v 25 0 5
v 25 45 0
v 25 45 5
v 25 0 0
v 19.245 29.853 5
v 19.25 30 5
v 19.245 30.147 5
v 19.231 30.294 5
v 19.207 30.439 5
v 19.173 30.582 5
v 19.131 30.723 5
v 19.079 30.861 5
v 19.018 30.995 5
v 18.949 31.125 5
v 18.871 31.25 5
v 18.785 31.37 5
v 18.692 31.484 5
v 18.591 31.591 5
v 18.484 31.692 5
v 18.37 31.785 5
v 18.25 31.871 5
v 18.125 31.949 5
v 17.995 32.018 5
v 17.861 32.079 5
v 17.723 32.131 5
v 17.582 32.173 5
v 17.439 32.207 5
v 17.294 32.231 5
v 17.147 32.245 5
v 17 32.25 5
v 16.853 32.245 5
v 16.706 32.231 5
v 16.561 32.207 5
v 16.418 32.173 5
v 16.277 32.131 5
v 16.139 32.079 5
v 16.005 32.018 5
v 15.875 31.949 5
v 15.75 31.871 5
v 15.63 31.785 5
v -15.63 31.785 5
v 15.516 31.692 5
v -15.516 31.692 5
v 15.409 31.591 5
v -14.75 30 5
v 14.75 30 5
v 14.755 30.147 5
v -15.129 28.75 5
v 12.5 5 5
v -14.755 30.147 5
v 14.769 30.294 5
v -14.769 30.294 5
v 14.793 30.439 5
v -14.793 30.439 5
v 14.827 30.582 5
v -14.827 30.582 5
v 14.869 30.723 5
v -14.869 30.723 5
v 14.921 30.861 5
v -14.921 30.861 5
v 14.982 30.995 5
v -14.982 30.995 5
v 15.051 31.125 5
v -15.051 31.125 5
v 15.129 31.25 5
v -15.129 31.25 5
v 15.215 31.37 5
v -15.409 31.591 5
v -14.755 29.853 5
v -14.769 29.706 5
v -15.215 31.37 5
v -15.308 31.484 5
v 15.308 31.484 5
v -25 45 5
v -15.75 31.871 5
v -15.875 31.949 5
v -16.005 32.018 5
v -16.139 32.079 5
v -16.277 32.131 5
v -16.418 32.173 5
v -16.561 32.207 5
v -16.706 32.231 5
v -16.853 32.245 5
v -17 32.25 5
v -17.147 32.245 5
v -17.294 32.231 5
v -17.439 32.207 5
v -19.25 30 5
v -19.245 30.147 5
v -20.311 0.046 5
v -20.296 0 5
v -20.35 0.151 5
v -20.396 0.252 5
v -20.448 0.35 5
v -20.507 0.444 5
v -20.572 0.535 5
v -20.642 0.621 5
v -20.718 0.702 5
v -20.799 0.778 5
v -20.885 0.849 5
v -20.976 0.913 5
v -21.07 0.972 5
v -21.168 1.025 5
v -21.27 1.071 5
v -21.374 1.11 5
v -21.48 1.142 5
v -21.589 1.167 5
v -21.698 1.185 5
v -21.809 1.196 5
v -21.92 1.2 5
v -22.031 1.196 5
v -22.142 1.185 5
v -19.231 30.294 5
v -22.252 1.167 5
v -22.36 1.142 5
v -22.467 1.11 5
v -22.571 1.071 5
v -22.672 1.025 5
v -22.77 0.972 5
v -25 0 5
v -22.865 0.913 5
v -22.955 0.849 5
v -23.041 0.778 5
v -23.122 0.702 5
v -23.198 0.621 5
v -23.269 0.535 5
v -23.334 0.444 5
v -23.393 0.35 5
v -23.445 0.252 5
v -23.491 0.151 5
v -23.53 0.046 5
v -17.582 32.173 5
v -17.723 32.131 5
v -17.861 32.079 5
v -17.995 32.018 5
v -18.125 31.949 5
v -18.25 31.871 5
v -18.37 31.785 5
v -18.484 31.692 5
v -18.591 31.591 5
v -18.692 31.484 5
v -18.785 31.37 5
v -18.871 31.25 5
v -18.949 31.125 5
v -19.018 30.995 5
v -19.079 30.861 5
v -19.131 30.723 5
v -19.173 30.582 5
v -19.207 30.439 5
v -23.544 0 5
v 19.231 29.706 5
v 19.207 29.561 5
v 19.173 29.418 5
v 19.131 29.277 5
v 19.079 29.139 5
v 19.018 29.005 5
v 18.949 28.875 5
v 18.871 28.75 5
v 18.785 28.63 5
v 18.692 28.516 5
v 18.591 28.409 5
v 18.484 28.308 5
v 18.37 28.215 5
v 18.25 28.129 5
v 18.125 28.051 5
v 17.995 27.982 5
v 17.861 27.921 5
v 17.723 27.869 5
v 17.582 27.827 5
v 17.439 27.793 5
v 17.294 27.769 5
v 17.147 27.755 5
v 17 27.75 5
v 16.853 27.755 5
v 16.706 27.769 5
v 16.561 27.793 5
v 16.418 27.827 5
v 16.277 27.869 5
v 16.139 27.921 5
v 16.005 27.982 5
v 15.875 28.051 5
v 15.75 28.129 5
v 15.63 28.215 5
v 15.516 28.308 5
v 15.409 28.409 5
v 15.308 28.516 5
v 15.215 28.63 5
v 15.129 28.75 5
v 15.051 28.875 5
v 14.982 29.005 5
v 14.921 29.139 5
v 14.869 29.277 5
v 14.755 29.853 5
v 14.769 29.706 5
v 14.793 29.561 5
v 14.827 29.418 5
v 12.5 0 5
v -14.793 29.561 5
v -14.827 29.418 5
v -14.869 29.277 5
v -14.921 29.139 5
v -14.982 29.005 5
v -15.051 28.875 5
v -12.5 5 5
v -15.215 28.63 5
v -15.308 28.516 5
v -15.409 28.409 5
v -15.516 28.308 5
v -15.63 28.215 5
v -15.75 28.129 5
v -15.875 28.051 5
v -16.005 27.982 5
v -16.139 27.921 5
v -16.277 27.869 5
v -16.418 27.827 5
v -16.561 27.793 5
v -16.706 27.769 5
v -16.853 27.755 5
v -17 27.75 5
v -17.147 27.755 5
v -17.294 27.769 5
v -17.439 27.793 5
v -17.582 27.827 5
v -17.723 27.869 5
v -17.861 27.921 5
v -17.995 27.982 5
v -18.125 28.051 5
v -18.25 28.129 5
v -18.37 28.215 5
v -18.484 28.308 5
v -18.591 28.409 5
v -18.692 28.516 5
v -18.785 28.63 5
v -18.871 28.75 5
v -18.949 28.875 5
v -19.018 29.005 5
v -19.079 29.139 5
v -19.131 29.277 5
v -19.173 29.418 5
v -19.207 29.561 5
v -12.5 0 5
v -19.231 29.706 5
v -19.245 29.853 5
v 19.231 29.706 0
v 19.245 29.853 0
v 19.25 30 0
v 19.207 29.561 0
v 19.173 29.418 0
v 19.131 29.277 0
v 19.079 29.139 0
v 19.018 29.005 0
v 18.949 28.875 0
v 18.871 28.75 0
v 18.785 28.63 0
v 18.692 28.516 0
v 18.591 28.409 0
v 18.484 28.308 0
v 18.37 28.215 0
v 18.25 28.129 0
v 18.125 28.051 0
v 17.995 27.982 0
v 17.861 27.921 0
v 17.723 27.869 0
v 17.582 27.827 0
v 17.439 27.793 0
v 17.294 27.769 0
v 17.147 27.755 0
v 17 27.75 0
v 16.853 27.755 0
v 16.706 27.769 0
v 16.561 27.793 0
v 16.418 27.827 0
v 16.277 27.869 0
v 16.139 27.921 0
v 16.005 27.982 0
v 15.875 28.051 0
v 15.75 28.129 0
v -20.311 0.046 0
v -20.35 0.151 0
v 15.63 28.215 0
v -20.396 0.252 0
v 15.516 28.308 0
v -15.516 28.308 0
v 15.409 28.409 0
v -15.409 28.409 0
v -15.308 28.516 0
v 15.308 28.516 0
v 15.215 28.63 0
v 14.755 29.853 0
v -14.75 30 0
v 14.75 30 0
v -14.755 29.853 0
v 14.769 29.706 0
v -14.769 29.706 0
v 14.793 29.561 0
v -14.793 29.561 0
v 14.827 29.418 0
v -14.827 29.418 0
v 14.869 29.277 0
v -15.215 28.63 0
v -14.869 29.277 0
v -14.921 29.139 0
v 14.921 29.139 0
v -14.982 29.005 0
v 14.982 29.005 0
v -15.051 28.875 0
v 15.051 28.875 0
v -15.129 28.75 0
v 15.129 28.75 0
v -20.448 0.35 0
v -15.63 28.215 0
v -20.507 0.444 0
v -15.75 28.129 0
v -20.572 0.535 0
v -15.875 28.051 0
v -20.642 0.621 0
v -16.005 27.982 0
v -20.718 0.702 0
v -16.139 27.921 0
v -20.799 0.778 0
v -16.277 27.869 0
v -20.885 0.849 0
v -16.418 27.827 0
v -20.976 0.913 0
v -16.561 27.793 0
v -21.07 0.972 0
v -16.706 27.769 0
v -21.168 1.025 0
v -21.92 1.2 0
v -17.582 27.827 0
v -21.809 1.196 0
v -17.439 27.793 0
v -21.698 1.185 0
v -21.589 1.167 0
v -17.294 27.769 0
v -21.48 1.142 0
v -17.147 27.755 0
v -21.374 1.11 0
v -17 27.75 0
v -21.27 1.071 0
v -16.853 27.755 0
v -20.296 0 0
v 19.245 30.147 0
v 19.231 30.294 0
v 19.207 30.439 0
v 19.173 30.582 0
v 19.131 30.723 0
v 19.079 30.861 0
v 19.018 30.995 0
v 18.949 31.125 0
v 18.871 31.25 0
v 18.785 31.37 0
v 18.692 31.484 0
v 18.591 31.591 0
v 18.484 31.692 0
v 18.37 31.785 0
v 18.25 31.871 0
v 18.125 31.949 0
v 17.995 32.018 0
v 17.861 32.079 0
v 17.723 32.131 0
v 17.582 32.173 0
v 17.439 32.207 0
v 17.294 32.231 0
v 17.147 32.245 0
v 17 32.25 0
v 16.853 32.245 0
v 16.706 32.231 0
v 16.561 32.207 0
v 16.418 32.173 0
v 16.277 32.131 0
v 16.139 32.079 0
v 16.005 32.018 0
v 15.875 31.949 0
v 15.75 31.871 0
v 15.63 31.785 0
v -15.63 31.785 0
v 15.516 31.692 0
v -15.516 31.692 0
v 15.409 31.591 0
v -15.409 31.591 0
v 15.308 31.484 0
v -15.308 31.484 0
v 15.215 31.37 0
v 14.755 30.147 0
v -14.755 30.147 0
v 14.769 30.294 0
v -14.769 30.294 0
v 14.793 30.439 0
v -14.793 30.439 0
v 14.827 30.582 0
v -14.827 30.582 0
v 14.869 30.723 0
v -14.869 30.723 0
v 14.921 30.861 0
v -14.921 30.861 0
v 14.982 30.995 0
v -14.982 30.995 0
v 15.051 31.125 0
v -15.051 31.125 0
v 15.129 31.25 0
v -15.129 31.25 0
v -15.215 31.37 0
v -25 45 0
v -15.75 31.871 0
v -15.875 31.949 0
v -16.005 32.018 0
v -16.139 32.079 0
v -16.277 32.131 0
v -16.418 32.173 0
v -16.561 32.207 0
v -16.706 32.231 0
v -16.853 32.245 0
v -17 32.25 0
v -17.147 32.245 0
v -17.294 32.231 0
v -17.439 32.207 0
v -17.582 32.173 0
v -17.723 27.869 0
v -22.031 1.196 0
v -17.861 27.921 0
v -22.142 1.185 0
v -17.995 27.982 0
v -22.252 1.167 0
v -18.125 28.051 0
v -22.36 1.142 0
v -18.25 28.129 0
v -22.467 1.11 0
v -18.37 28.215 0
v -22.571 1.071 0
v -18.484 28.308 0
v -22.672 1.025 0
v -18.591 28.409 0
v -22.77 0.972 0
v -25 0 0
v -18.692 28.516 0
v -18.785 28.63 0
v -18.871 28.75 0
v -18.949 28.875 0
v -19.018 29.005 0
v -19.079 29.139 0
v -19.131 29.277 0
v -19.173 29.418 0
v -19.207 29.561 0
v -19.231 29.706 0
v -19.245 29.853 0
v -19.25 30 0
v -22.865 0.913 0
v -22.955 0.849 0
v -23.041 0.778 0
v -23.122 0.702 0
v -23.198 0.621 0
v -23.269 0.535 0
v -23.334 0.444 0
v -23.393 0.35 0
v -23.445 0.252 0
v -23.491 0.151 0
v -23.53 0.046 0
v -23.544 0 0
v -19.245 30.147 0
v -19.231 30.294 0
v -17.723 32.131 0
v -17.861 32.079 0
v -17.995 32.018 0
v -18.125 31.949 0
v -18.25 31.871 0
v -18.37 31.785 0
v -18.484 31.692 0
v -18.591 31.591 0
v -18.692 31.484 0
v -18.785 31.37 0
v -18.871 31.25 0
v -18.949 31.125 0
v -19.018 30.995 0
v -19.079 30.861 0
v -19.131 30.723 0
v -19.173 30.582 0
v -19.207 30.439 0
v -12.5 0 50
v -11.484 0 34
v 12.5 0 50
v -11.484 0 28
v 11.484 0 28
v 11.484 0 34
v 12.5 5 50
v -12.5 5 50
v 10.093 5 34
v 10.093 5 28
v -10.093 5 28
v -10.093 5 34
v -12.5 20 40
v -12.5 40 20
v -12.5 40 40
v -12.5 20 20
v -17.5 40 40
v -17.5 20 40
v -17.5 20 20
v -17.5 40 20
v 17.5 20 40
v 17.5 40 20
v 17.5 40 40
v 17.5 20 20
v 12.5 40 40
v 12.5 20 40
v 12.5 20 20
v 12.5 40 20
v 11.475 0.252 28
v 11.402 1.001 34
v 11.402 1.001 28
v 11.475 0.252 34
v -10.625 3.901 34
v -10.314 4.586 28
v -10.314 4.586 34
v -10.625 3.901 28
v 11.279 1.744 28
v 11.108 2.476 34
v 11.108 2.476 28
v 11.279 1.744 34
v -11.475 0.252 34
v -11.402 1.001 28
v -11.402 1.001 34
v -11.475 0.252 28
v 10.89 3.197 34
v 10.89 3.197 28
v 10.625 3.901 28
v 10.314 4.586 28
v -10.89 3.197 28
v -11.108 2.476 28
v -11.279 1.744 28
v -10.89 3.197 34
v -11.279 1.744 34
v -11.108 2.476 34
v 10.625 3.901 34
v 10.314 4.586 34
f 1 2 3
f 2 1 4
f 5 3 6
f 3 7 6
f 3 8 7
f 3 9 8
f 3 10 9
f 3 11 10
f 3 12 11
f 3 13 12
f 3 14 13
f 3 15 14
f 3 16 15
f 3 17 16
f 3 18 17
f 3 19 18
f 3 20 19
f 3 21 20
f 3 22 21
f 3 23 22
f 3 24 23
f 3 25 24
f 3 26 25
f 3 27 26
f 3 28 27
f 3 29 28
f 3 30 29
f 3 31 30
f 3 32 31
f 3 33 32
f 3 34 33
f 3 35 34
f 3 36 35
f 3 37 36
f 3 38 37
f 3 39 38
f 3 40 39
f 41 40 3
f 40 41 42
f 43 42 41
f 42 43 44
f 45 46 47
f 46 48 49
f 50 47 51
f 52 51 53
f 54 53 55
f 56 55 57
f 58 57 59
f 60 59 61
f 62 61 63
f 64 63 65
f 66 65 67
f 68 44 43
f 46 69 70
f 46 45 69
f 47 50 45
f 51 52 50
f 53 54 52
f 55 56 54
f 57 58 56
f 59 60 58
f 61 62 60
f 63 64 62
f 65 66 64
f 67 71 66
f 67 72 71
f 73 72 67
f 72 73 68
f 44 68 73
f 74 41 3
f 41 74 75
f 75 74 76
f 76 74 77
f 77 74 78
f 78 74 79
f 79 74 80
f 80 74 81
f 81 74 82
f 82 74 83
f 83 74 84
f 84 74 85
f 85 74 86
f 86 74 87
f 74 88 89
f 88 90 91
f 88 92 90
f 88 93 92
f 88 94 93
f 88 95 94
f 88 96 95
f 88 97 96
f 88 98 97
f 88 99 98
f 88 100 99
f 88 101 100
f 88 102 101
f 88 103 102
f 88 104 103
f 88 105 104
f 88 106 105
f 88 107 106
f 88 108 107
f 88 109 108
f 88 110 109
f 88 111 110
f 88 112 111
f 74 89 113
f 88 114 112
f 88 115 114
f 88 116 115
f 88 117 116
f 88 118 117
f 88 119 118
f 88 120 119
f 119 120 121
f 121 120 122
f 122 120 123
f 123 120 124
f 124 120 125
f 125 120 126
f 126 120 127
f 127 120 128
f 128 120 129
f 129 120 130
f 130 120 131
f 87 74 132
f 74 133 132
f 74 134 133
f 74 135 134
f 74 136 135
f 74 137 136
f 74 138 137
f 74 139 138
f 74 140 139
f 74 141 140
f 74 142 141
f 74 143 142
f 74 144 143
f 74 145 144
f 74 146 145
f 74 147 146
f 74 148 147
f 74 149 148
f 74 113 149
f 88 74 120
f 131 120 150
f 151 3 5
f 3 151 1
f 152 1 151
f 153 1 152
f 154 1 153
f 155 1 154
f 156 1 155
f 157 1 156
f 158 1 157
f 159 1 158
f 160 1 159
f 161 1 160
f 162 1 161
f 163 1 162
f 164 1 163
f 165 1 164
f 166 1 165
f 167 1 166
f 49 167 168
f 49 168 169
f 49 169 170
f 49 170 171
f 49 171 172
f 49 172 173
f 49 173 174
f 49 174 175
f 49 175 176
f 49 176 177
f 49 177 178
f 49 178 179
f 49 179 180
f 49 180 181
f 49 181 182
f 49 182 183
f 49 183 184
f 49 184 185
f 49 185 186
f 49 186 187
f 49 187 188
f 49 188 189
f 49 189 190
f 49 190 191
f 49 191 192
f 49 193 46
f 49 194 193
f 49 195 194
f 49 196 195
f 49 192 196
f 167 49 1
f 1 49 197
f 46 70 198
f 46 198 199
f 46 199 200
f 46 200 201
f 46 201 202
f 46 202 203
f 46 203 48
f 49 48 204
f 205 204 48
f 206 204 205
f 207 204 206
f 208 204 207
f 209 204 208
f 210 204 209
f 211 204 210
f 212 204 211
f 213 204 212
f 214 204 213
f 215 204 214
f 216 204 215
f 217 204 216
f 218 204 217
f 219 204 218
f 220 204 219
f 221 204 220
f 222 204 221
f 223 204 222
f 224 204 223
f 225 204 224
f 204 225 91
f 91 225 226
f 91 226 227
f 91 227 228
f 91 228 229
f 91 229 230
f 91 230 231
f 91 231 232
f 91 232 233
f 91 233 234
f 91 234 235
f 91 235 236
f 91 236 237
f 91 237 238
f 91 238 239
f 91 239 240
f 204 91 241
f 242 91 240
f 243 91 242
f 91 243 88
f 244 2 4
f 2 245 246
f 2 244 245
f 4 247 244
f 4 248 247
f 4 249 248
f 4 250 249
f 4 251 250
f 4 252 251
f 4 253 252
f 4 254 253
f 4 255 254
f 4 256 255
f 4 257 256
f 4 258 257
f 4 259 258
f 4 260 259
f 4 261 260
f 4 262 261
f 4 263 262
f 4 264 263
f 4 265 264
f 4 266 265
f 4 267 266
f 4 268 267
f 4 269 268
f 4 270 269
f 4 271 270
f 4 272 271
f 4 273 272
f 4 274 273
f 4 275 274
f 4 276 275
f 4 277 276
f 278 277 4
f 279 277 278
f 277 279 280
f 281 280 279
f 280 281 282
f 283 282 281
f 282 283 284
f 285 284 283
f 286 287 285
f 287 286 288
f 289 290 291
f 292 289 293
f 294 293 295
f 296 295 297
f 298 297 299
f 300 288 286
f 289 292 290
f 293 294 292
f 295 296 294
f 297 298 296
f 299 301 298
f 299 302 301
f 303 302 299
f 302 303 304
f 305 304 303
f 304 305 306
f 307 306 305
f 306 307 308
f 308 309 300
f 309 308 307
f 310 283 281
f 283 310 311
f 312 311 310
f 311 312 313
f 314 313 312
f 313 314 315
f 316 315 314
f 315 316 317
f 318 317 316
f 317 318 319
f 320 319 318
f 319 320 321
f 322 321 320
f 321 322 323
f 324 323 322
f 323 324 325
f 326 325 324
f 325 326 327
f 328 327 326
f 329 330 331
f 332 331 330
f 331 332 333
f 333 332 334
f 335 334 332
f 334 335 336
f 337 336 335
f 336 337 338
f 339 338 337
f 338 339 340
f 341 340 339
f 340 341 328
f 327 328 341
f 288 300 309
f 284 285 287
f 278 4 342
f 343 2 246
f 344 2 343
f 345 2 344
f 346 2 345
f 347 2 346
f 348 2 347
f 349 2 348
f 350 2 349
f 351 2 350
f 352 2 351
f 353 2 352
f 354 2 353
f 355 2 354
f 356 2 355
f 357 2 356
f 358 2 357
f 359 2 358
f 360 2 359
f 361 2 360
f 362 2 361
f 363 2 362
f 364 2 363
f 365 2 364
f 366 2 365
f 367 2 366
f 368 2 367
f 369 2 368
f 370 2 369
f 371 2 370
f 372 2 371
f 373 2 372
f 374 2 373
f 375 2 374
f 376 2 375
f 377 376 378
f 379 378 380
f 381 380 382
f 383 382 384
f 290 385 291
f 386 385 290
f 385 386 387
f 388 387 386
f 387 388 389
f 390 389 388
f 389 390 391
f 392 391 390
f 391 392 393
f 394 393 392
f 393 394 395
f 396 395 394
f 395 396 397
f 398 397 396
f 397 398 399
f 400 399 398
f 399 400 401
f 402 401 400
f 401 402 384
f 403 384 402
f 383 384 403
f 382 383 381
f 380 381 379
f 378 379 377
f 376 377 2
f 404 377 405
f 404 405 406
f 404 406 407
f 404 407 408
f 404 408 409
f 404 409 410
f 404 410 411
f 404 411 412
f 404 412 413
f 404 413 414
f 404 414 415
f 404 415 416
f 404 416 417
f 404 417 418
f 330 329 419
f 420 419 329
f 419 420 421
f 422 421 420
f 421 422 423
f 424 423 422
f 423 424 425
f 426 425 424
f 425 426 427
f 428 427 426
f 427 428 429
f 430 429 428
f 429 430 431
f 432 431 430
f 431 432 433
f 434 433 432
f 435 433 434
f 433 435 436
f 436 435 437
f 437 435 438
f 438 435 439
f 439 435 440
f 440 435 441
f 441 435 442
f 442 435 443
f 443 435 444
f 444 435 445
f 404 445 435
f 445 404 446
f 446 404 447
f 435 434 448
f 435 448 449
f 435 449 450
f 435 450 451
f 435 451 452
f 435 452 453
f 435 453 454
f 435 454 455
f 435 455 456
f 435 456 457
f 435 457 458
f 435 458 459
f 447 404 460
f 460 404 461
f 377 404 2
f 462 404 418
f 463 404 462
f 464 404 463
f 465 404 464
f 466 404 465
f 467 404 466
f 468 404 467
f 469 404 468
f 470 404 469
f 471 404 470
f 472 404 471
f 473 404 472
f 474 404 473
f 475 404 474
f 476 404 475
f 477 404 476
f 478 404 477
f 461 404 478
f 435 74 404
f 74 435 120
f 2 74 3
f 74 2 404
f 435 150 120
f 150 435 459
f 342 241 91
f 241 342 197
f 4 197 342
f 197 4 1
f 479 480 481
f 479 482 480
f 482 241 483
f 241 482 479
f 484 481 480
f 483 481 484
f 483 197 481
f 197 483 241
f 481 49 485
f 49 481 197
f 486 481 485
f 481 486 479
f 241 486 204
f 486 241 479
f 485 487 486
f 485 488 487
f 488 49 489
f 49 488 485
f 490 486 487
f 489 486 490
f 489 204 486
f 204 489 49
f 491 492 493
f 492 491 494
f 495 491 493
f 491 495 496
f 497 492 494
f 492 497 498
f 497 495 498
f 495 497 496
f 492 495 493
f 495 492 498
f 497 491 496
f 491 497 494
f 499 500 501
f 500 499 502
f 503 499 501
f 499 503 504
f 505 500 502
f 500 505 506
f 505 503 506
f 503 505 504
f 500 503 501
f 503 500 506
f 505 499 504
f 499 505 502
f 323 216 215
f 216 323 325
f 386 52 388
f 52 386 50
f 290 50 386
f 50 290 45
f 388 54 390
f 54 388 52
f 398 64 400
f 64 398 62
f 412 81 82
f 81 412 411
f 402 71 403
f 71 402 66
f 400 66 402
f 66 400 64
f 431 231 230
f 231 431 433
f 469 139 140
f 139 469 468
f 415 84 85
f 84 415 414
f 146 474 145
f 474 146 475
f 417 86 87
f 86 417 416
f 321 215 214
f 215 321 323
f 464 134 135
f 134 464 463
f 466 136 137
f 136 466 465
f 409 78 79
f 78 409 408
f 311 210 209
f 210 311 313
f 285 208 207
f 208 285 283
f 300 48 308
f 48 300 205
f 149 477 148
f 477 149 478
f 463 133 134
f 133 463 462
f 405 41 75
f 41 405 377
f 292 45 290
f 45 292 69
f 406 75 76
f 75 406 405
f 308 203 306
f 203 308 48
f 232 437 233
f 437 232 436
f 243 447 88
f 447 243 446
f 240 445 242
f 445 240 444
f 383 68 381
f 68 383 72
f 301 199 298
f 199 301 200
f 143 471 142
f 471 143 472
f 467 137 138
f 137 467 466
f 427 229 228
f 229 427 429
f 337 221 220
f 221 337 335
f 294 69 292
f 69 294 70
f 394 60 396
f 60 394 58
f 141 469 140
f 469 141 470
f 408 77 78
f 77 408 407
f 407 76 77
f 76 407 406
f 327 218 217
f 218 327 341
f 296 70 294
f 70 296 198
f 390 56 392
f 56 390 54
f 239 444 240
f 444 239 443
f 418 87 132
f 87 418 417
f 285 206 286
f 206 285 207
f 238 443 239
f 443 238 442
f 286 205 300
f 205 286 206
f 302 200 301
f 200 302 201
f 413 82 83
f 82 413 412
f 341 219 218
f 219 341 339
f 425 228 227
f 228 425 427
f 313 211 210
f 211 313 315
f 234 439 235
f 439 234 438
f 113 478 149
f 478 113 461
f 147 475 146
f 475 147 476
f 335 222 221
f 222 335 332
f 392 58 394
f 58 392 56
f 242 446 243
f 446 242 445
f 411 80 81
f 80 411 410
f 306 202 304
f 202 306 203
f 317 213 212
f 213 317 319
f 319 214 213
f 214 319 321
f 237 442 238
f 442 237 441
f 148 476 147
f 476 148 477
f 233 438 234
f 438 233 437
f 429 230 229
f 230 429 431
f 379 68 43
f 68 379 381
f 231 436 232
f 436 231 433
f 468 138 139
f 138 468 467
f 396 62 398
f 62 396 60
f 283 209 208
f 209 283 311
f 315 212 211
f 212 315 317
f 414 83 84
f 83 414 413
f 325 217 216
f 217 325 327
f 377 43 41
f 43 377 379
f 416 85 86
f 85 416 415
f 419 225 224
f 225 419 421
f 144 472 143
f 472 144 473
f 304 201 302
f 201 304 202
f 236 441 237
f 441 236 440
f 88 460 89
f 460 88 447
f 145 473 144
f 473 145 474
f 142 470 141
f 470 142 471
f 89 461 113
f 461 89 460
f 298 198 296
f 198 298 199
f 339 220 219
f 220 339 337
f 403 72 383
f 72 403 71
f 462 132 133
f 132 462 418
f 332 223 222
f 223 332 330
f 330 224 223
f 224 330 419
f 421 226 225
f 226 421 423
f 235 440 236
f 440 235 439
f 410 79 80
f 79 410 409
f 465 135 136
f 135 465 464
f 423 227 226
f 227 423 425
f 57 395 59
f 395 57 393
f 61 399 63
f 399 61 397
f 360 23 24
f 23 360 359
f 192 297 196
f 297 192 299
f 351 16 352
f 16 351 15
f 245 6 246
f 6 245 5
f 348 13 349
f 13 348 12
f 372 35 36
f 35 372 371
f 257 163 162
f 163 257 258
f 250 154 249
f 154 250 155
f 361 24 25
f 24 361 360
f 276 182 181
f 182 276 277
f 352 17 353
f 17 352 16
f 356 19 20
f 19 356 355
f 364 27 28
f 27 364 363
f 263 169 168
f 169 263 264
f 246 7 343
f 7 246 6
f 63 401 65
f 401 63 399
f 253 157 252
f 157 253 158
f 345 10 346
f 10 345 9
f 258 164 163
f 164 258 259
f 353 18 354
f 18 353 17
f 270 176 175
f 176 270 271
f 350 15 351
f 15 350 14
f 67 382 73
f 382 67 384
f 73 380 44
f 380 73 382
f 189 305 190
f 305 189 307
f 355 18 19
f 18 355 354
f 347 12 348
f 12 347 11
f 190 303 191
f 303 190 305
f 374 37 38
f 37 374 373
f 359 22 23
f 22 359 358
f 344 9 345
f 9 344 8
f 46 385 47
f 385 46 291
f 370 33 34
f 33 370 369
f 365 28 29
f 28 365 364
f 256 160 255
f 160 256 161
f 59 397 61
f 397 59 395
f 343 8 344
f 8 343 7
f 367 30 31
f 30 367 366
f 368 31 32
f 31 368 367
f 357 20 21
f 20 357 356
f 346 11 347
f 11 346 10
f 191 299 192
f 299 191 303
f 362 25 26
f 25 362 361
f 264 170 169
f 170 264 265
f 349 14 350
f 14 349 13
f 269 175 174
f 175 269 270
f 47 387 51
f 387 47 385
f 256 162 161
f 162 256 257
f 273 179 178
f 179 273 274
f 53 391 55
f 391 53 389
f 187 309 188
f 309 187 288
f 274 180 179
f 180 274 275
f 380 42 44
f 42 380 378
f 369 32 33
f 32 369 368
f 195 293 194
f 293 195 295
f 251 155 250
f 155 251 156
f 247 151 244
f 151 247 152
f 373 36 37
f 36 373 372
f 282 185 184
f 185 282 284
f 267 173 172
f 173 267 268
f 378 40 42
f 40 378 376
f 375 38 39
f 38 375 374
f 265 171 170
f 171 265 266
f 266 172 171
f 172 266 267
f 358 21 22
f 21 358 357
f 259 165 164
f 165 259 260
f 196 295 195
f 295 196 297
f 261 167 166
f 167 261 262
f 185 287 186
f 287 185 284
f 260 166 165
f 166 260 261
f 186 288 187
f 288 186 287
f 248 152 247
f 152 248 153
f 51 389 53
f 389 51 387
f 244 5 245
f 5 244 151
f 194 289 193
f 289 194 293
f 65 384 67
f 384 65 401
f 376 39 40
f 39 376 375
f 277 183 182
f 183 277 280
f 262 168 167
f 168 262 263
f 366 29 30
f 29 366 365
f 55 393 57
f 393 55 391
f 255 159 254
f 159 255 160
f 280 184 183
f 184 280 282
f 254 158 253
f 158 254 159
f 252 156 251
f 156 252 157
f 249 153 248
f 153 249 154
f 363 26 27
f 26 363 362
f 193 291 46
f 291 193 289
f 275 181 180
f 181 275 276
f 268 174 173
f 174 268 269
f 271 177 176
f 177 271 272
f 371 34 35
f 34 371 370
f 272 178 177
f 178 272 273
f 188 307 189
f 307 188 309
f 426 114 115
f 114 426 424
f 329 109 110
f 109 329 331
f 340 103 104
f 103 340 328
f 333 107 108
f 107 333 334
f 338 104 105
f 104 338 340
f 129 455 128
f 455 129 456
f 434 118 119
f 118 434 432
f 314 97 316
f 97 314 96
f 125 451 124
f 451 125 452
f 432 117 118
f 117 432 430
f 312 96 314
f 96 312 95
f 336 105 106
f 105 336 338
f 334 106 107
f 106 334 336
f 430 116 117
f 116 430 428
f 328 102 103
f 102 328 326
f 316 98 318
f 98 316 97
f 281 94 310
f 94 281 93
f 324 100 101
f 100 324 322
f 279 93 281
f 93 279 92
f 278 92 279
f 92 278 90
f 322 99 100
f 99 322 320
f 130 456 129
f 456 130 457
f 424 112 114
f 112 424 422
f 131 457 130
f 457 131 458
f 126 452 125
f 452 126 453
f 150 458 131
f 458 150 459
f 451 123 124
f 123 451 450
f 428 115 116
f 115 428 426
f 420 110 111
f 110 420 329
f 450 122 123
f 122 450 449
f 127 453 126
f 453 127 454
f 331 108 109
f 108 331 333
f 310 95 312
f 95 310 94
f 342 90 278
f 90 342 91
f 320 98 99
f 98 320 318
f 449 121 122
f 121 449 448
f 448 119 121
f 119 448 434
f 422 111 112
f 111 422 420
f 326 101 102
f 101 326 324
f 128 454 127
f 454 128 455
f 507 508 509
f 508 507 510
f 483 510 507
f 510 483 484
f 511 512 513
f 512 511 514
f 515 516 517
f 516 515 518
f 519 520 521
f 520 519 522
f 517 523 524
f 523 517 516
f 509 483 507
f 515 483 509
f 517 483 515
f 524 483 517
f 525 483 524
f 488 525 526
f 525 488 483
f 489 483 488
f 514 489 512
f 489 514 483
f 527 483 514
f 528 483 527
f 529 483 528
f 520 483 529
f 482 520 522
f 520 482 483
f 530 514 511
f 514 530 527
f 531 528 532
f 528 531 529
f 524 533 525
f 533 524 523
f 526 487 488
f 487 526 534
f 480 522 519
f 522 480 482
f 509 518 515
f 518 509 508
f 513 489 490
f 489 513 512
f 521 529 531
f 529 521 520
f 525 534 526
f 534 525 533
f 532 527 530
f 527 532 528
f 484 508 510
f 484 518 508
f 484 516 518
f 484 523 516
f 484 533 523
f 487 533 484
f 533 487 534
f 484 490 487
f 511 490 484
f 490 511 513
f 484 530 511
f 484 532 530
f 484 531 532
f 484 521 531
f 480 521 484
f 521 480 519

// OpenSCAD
// L-shaped mounting bracket for NEMA 17 stepper motor (e.g. syringe pump)
// Print orientation: base plate on bed, vertical plate builds up in +Z

// ---------- Parameters ----------
base_x      = 50;    // base plate length in X (-25 to +25)
base_y      = 45;    // base plate width in Y (0 to 45)
base_t      = 5;     // base plate thickness in Z

hole_m4_x   = 17;    // M4 hole offset from centre in X (holes at -17, +17)
hole_m4_y   = 30;    // M4 hole Y position
hole_m4_d   = 4.5;   // M4 hole diameter

motor_x     = 25;    // motor plate length in X (-25 to +25)
motor_y     = 5;     // motor plate width in Y (0 to 5)
motor_z     = 50;    // motor plate height in Z

boss_d      = 23;    // motor centring boss hole diameter
boss_x      = 0;     // boss hole X position
boss_z      = 28;    // boss hole Z position

screw_d     = 3.4;   // M3 screw hole diameter
screw_pitch = 31;    // M3 screw hole square pattern size
screw_n     = 4;     // number of screw holes

gusset_t    = 5;     // gusset thickness in X
gusset_y    = 20;    // gusset leg along +Y
gusset_z    = 20;    // gusset leg along +Z

eps         = 0.5;   // cutter overshoot past faces
$fn         = 96;    // curve resolution

// ---------- Model ----------
difference() {
    union() {
        // Base plate
        translate([-base_x/2, 0, 0])
            cube([base_x, base_y, base_t]);

        // Vertical motor plate (stands on back edge of base)
        translate([-motor_x/2, 0, 0])
            cube([motor_x, motor_y, motor_z]);

        // Left gusset (right-angle corner at y=5, z=5)
        translate([-motor_x/2 - gusset_t, gusset_y, gusset_z])
            cube([gusset_t, gusset_y, gusset_z]);

        // Right gusset (right-angle corner at y=5, z=5)
        translate([motor_x/2, gusset_y, gusset_z])
            cube([gusset_t, gusset_y, gusset_z]);
    }

    // Through-holes in base plate (M4)
    for (sx = [-1, 1])
        translate([sx * hole_m4_x, hole_m4_y, -eps])
            cylinder(d = hole_m4_d, h = base_t + 2 * eps);

    // Motor boss hole through vertical plate (along Y)
    translate([boss_x, -eps, boss_z])
        cylinder(d = boss_d, h = motor_y + 2 * eps);

    // M3 screw holes on square pattern, centred on boss hole
    for (i = [0 : screw_n - 1]) {
        a = screw_pitch / sqrt(2);
        x = (i % 2 == 0) ? -a : a;
        z = (i / 2) * screw_pitch;
        translate([x, -eps, z])
            cylinder(d = screw_d, h = motor_y + 2 * eps);
    }
}
